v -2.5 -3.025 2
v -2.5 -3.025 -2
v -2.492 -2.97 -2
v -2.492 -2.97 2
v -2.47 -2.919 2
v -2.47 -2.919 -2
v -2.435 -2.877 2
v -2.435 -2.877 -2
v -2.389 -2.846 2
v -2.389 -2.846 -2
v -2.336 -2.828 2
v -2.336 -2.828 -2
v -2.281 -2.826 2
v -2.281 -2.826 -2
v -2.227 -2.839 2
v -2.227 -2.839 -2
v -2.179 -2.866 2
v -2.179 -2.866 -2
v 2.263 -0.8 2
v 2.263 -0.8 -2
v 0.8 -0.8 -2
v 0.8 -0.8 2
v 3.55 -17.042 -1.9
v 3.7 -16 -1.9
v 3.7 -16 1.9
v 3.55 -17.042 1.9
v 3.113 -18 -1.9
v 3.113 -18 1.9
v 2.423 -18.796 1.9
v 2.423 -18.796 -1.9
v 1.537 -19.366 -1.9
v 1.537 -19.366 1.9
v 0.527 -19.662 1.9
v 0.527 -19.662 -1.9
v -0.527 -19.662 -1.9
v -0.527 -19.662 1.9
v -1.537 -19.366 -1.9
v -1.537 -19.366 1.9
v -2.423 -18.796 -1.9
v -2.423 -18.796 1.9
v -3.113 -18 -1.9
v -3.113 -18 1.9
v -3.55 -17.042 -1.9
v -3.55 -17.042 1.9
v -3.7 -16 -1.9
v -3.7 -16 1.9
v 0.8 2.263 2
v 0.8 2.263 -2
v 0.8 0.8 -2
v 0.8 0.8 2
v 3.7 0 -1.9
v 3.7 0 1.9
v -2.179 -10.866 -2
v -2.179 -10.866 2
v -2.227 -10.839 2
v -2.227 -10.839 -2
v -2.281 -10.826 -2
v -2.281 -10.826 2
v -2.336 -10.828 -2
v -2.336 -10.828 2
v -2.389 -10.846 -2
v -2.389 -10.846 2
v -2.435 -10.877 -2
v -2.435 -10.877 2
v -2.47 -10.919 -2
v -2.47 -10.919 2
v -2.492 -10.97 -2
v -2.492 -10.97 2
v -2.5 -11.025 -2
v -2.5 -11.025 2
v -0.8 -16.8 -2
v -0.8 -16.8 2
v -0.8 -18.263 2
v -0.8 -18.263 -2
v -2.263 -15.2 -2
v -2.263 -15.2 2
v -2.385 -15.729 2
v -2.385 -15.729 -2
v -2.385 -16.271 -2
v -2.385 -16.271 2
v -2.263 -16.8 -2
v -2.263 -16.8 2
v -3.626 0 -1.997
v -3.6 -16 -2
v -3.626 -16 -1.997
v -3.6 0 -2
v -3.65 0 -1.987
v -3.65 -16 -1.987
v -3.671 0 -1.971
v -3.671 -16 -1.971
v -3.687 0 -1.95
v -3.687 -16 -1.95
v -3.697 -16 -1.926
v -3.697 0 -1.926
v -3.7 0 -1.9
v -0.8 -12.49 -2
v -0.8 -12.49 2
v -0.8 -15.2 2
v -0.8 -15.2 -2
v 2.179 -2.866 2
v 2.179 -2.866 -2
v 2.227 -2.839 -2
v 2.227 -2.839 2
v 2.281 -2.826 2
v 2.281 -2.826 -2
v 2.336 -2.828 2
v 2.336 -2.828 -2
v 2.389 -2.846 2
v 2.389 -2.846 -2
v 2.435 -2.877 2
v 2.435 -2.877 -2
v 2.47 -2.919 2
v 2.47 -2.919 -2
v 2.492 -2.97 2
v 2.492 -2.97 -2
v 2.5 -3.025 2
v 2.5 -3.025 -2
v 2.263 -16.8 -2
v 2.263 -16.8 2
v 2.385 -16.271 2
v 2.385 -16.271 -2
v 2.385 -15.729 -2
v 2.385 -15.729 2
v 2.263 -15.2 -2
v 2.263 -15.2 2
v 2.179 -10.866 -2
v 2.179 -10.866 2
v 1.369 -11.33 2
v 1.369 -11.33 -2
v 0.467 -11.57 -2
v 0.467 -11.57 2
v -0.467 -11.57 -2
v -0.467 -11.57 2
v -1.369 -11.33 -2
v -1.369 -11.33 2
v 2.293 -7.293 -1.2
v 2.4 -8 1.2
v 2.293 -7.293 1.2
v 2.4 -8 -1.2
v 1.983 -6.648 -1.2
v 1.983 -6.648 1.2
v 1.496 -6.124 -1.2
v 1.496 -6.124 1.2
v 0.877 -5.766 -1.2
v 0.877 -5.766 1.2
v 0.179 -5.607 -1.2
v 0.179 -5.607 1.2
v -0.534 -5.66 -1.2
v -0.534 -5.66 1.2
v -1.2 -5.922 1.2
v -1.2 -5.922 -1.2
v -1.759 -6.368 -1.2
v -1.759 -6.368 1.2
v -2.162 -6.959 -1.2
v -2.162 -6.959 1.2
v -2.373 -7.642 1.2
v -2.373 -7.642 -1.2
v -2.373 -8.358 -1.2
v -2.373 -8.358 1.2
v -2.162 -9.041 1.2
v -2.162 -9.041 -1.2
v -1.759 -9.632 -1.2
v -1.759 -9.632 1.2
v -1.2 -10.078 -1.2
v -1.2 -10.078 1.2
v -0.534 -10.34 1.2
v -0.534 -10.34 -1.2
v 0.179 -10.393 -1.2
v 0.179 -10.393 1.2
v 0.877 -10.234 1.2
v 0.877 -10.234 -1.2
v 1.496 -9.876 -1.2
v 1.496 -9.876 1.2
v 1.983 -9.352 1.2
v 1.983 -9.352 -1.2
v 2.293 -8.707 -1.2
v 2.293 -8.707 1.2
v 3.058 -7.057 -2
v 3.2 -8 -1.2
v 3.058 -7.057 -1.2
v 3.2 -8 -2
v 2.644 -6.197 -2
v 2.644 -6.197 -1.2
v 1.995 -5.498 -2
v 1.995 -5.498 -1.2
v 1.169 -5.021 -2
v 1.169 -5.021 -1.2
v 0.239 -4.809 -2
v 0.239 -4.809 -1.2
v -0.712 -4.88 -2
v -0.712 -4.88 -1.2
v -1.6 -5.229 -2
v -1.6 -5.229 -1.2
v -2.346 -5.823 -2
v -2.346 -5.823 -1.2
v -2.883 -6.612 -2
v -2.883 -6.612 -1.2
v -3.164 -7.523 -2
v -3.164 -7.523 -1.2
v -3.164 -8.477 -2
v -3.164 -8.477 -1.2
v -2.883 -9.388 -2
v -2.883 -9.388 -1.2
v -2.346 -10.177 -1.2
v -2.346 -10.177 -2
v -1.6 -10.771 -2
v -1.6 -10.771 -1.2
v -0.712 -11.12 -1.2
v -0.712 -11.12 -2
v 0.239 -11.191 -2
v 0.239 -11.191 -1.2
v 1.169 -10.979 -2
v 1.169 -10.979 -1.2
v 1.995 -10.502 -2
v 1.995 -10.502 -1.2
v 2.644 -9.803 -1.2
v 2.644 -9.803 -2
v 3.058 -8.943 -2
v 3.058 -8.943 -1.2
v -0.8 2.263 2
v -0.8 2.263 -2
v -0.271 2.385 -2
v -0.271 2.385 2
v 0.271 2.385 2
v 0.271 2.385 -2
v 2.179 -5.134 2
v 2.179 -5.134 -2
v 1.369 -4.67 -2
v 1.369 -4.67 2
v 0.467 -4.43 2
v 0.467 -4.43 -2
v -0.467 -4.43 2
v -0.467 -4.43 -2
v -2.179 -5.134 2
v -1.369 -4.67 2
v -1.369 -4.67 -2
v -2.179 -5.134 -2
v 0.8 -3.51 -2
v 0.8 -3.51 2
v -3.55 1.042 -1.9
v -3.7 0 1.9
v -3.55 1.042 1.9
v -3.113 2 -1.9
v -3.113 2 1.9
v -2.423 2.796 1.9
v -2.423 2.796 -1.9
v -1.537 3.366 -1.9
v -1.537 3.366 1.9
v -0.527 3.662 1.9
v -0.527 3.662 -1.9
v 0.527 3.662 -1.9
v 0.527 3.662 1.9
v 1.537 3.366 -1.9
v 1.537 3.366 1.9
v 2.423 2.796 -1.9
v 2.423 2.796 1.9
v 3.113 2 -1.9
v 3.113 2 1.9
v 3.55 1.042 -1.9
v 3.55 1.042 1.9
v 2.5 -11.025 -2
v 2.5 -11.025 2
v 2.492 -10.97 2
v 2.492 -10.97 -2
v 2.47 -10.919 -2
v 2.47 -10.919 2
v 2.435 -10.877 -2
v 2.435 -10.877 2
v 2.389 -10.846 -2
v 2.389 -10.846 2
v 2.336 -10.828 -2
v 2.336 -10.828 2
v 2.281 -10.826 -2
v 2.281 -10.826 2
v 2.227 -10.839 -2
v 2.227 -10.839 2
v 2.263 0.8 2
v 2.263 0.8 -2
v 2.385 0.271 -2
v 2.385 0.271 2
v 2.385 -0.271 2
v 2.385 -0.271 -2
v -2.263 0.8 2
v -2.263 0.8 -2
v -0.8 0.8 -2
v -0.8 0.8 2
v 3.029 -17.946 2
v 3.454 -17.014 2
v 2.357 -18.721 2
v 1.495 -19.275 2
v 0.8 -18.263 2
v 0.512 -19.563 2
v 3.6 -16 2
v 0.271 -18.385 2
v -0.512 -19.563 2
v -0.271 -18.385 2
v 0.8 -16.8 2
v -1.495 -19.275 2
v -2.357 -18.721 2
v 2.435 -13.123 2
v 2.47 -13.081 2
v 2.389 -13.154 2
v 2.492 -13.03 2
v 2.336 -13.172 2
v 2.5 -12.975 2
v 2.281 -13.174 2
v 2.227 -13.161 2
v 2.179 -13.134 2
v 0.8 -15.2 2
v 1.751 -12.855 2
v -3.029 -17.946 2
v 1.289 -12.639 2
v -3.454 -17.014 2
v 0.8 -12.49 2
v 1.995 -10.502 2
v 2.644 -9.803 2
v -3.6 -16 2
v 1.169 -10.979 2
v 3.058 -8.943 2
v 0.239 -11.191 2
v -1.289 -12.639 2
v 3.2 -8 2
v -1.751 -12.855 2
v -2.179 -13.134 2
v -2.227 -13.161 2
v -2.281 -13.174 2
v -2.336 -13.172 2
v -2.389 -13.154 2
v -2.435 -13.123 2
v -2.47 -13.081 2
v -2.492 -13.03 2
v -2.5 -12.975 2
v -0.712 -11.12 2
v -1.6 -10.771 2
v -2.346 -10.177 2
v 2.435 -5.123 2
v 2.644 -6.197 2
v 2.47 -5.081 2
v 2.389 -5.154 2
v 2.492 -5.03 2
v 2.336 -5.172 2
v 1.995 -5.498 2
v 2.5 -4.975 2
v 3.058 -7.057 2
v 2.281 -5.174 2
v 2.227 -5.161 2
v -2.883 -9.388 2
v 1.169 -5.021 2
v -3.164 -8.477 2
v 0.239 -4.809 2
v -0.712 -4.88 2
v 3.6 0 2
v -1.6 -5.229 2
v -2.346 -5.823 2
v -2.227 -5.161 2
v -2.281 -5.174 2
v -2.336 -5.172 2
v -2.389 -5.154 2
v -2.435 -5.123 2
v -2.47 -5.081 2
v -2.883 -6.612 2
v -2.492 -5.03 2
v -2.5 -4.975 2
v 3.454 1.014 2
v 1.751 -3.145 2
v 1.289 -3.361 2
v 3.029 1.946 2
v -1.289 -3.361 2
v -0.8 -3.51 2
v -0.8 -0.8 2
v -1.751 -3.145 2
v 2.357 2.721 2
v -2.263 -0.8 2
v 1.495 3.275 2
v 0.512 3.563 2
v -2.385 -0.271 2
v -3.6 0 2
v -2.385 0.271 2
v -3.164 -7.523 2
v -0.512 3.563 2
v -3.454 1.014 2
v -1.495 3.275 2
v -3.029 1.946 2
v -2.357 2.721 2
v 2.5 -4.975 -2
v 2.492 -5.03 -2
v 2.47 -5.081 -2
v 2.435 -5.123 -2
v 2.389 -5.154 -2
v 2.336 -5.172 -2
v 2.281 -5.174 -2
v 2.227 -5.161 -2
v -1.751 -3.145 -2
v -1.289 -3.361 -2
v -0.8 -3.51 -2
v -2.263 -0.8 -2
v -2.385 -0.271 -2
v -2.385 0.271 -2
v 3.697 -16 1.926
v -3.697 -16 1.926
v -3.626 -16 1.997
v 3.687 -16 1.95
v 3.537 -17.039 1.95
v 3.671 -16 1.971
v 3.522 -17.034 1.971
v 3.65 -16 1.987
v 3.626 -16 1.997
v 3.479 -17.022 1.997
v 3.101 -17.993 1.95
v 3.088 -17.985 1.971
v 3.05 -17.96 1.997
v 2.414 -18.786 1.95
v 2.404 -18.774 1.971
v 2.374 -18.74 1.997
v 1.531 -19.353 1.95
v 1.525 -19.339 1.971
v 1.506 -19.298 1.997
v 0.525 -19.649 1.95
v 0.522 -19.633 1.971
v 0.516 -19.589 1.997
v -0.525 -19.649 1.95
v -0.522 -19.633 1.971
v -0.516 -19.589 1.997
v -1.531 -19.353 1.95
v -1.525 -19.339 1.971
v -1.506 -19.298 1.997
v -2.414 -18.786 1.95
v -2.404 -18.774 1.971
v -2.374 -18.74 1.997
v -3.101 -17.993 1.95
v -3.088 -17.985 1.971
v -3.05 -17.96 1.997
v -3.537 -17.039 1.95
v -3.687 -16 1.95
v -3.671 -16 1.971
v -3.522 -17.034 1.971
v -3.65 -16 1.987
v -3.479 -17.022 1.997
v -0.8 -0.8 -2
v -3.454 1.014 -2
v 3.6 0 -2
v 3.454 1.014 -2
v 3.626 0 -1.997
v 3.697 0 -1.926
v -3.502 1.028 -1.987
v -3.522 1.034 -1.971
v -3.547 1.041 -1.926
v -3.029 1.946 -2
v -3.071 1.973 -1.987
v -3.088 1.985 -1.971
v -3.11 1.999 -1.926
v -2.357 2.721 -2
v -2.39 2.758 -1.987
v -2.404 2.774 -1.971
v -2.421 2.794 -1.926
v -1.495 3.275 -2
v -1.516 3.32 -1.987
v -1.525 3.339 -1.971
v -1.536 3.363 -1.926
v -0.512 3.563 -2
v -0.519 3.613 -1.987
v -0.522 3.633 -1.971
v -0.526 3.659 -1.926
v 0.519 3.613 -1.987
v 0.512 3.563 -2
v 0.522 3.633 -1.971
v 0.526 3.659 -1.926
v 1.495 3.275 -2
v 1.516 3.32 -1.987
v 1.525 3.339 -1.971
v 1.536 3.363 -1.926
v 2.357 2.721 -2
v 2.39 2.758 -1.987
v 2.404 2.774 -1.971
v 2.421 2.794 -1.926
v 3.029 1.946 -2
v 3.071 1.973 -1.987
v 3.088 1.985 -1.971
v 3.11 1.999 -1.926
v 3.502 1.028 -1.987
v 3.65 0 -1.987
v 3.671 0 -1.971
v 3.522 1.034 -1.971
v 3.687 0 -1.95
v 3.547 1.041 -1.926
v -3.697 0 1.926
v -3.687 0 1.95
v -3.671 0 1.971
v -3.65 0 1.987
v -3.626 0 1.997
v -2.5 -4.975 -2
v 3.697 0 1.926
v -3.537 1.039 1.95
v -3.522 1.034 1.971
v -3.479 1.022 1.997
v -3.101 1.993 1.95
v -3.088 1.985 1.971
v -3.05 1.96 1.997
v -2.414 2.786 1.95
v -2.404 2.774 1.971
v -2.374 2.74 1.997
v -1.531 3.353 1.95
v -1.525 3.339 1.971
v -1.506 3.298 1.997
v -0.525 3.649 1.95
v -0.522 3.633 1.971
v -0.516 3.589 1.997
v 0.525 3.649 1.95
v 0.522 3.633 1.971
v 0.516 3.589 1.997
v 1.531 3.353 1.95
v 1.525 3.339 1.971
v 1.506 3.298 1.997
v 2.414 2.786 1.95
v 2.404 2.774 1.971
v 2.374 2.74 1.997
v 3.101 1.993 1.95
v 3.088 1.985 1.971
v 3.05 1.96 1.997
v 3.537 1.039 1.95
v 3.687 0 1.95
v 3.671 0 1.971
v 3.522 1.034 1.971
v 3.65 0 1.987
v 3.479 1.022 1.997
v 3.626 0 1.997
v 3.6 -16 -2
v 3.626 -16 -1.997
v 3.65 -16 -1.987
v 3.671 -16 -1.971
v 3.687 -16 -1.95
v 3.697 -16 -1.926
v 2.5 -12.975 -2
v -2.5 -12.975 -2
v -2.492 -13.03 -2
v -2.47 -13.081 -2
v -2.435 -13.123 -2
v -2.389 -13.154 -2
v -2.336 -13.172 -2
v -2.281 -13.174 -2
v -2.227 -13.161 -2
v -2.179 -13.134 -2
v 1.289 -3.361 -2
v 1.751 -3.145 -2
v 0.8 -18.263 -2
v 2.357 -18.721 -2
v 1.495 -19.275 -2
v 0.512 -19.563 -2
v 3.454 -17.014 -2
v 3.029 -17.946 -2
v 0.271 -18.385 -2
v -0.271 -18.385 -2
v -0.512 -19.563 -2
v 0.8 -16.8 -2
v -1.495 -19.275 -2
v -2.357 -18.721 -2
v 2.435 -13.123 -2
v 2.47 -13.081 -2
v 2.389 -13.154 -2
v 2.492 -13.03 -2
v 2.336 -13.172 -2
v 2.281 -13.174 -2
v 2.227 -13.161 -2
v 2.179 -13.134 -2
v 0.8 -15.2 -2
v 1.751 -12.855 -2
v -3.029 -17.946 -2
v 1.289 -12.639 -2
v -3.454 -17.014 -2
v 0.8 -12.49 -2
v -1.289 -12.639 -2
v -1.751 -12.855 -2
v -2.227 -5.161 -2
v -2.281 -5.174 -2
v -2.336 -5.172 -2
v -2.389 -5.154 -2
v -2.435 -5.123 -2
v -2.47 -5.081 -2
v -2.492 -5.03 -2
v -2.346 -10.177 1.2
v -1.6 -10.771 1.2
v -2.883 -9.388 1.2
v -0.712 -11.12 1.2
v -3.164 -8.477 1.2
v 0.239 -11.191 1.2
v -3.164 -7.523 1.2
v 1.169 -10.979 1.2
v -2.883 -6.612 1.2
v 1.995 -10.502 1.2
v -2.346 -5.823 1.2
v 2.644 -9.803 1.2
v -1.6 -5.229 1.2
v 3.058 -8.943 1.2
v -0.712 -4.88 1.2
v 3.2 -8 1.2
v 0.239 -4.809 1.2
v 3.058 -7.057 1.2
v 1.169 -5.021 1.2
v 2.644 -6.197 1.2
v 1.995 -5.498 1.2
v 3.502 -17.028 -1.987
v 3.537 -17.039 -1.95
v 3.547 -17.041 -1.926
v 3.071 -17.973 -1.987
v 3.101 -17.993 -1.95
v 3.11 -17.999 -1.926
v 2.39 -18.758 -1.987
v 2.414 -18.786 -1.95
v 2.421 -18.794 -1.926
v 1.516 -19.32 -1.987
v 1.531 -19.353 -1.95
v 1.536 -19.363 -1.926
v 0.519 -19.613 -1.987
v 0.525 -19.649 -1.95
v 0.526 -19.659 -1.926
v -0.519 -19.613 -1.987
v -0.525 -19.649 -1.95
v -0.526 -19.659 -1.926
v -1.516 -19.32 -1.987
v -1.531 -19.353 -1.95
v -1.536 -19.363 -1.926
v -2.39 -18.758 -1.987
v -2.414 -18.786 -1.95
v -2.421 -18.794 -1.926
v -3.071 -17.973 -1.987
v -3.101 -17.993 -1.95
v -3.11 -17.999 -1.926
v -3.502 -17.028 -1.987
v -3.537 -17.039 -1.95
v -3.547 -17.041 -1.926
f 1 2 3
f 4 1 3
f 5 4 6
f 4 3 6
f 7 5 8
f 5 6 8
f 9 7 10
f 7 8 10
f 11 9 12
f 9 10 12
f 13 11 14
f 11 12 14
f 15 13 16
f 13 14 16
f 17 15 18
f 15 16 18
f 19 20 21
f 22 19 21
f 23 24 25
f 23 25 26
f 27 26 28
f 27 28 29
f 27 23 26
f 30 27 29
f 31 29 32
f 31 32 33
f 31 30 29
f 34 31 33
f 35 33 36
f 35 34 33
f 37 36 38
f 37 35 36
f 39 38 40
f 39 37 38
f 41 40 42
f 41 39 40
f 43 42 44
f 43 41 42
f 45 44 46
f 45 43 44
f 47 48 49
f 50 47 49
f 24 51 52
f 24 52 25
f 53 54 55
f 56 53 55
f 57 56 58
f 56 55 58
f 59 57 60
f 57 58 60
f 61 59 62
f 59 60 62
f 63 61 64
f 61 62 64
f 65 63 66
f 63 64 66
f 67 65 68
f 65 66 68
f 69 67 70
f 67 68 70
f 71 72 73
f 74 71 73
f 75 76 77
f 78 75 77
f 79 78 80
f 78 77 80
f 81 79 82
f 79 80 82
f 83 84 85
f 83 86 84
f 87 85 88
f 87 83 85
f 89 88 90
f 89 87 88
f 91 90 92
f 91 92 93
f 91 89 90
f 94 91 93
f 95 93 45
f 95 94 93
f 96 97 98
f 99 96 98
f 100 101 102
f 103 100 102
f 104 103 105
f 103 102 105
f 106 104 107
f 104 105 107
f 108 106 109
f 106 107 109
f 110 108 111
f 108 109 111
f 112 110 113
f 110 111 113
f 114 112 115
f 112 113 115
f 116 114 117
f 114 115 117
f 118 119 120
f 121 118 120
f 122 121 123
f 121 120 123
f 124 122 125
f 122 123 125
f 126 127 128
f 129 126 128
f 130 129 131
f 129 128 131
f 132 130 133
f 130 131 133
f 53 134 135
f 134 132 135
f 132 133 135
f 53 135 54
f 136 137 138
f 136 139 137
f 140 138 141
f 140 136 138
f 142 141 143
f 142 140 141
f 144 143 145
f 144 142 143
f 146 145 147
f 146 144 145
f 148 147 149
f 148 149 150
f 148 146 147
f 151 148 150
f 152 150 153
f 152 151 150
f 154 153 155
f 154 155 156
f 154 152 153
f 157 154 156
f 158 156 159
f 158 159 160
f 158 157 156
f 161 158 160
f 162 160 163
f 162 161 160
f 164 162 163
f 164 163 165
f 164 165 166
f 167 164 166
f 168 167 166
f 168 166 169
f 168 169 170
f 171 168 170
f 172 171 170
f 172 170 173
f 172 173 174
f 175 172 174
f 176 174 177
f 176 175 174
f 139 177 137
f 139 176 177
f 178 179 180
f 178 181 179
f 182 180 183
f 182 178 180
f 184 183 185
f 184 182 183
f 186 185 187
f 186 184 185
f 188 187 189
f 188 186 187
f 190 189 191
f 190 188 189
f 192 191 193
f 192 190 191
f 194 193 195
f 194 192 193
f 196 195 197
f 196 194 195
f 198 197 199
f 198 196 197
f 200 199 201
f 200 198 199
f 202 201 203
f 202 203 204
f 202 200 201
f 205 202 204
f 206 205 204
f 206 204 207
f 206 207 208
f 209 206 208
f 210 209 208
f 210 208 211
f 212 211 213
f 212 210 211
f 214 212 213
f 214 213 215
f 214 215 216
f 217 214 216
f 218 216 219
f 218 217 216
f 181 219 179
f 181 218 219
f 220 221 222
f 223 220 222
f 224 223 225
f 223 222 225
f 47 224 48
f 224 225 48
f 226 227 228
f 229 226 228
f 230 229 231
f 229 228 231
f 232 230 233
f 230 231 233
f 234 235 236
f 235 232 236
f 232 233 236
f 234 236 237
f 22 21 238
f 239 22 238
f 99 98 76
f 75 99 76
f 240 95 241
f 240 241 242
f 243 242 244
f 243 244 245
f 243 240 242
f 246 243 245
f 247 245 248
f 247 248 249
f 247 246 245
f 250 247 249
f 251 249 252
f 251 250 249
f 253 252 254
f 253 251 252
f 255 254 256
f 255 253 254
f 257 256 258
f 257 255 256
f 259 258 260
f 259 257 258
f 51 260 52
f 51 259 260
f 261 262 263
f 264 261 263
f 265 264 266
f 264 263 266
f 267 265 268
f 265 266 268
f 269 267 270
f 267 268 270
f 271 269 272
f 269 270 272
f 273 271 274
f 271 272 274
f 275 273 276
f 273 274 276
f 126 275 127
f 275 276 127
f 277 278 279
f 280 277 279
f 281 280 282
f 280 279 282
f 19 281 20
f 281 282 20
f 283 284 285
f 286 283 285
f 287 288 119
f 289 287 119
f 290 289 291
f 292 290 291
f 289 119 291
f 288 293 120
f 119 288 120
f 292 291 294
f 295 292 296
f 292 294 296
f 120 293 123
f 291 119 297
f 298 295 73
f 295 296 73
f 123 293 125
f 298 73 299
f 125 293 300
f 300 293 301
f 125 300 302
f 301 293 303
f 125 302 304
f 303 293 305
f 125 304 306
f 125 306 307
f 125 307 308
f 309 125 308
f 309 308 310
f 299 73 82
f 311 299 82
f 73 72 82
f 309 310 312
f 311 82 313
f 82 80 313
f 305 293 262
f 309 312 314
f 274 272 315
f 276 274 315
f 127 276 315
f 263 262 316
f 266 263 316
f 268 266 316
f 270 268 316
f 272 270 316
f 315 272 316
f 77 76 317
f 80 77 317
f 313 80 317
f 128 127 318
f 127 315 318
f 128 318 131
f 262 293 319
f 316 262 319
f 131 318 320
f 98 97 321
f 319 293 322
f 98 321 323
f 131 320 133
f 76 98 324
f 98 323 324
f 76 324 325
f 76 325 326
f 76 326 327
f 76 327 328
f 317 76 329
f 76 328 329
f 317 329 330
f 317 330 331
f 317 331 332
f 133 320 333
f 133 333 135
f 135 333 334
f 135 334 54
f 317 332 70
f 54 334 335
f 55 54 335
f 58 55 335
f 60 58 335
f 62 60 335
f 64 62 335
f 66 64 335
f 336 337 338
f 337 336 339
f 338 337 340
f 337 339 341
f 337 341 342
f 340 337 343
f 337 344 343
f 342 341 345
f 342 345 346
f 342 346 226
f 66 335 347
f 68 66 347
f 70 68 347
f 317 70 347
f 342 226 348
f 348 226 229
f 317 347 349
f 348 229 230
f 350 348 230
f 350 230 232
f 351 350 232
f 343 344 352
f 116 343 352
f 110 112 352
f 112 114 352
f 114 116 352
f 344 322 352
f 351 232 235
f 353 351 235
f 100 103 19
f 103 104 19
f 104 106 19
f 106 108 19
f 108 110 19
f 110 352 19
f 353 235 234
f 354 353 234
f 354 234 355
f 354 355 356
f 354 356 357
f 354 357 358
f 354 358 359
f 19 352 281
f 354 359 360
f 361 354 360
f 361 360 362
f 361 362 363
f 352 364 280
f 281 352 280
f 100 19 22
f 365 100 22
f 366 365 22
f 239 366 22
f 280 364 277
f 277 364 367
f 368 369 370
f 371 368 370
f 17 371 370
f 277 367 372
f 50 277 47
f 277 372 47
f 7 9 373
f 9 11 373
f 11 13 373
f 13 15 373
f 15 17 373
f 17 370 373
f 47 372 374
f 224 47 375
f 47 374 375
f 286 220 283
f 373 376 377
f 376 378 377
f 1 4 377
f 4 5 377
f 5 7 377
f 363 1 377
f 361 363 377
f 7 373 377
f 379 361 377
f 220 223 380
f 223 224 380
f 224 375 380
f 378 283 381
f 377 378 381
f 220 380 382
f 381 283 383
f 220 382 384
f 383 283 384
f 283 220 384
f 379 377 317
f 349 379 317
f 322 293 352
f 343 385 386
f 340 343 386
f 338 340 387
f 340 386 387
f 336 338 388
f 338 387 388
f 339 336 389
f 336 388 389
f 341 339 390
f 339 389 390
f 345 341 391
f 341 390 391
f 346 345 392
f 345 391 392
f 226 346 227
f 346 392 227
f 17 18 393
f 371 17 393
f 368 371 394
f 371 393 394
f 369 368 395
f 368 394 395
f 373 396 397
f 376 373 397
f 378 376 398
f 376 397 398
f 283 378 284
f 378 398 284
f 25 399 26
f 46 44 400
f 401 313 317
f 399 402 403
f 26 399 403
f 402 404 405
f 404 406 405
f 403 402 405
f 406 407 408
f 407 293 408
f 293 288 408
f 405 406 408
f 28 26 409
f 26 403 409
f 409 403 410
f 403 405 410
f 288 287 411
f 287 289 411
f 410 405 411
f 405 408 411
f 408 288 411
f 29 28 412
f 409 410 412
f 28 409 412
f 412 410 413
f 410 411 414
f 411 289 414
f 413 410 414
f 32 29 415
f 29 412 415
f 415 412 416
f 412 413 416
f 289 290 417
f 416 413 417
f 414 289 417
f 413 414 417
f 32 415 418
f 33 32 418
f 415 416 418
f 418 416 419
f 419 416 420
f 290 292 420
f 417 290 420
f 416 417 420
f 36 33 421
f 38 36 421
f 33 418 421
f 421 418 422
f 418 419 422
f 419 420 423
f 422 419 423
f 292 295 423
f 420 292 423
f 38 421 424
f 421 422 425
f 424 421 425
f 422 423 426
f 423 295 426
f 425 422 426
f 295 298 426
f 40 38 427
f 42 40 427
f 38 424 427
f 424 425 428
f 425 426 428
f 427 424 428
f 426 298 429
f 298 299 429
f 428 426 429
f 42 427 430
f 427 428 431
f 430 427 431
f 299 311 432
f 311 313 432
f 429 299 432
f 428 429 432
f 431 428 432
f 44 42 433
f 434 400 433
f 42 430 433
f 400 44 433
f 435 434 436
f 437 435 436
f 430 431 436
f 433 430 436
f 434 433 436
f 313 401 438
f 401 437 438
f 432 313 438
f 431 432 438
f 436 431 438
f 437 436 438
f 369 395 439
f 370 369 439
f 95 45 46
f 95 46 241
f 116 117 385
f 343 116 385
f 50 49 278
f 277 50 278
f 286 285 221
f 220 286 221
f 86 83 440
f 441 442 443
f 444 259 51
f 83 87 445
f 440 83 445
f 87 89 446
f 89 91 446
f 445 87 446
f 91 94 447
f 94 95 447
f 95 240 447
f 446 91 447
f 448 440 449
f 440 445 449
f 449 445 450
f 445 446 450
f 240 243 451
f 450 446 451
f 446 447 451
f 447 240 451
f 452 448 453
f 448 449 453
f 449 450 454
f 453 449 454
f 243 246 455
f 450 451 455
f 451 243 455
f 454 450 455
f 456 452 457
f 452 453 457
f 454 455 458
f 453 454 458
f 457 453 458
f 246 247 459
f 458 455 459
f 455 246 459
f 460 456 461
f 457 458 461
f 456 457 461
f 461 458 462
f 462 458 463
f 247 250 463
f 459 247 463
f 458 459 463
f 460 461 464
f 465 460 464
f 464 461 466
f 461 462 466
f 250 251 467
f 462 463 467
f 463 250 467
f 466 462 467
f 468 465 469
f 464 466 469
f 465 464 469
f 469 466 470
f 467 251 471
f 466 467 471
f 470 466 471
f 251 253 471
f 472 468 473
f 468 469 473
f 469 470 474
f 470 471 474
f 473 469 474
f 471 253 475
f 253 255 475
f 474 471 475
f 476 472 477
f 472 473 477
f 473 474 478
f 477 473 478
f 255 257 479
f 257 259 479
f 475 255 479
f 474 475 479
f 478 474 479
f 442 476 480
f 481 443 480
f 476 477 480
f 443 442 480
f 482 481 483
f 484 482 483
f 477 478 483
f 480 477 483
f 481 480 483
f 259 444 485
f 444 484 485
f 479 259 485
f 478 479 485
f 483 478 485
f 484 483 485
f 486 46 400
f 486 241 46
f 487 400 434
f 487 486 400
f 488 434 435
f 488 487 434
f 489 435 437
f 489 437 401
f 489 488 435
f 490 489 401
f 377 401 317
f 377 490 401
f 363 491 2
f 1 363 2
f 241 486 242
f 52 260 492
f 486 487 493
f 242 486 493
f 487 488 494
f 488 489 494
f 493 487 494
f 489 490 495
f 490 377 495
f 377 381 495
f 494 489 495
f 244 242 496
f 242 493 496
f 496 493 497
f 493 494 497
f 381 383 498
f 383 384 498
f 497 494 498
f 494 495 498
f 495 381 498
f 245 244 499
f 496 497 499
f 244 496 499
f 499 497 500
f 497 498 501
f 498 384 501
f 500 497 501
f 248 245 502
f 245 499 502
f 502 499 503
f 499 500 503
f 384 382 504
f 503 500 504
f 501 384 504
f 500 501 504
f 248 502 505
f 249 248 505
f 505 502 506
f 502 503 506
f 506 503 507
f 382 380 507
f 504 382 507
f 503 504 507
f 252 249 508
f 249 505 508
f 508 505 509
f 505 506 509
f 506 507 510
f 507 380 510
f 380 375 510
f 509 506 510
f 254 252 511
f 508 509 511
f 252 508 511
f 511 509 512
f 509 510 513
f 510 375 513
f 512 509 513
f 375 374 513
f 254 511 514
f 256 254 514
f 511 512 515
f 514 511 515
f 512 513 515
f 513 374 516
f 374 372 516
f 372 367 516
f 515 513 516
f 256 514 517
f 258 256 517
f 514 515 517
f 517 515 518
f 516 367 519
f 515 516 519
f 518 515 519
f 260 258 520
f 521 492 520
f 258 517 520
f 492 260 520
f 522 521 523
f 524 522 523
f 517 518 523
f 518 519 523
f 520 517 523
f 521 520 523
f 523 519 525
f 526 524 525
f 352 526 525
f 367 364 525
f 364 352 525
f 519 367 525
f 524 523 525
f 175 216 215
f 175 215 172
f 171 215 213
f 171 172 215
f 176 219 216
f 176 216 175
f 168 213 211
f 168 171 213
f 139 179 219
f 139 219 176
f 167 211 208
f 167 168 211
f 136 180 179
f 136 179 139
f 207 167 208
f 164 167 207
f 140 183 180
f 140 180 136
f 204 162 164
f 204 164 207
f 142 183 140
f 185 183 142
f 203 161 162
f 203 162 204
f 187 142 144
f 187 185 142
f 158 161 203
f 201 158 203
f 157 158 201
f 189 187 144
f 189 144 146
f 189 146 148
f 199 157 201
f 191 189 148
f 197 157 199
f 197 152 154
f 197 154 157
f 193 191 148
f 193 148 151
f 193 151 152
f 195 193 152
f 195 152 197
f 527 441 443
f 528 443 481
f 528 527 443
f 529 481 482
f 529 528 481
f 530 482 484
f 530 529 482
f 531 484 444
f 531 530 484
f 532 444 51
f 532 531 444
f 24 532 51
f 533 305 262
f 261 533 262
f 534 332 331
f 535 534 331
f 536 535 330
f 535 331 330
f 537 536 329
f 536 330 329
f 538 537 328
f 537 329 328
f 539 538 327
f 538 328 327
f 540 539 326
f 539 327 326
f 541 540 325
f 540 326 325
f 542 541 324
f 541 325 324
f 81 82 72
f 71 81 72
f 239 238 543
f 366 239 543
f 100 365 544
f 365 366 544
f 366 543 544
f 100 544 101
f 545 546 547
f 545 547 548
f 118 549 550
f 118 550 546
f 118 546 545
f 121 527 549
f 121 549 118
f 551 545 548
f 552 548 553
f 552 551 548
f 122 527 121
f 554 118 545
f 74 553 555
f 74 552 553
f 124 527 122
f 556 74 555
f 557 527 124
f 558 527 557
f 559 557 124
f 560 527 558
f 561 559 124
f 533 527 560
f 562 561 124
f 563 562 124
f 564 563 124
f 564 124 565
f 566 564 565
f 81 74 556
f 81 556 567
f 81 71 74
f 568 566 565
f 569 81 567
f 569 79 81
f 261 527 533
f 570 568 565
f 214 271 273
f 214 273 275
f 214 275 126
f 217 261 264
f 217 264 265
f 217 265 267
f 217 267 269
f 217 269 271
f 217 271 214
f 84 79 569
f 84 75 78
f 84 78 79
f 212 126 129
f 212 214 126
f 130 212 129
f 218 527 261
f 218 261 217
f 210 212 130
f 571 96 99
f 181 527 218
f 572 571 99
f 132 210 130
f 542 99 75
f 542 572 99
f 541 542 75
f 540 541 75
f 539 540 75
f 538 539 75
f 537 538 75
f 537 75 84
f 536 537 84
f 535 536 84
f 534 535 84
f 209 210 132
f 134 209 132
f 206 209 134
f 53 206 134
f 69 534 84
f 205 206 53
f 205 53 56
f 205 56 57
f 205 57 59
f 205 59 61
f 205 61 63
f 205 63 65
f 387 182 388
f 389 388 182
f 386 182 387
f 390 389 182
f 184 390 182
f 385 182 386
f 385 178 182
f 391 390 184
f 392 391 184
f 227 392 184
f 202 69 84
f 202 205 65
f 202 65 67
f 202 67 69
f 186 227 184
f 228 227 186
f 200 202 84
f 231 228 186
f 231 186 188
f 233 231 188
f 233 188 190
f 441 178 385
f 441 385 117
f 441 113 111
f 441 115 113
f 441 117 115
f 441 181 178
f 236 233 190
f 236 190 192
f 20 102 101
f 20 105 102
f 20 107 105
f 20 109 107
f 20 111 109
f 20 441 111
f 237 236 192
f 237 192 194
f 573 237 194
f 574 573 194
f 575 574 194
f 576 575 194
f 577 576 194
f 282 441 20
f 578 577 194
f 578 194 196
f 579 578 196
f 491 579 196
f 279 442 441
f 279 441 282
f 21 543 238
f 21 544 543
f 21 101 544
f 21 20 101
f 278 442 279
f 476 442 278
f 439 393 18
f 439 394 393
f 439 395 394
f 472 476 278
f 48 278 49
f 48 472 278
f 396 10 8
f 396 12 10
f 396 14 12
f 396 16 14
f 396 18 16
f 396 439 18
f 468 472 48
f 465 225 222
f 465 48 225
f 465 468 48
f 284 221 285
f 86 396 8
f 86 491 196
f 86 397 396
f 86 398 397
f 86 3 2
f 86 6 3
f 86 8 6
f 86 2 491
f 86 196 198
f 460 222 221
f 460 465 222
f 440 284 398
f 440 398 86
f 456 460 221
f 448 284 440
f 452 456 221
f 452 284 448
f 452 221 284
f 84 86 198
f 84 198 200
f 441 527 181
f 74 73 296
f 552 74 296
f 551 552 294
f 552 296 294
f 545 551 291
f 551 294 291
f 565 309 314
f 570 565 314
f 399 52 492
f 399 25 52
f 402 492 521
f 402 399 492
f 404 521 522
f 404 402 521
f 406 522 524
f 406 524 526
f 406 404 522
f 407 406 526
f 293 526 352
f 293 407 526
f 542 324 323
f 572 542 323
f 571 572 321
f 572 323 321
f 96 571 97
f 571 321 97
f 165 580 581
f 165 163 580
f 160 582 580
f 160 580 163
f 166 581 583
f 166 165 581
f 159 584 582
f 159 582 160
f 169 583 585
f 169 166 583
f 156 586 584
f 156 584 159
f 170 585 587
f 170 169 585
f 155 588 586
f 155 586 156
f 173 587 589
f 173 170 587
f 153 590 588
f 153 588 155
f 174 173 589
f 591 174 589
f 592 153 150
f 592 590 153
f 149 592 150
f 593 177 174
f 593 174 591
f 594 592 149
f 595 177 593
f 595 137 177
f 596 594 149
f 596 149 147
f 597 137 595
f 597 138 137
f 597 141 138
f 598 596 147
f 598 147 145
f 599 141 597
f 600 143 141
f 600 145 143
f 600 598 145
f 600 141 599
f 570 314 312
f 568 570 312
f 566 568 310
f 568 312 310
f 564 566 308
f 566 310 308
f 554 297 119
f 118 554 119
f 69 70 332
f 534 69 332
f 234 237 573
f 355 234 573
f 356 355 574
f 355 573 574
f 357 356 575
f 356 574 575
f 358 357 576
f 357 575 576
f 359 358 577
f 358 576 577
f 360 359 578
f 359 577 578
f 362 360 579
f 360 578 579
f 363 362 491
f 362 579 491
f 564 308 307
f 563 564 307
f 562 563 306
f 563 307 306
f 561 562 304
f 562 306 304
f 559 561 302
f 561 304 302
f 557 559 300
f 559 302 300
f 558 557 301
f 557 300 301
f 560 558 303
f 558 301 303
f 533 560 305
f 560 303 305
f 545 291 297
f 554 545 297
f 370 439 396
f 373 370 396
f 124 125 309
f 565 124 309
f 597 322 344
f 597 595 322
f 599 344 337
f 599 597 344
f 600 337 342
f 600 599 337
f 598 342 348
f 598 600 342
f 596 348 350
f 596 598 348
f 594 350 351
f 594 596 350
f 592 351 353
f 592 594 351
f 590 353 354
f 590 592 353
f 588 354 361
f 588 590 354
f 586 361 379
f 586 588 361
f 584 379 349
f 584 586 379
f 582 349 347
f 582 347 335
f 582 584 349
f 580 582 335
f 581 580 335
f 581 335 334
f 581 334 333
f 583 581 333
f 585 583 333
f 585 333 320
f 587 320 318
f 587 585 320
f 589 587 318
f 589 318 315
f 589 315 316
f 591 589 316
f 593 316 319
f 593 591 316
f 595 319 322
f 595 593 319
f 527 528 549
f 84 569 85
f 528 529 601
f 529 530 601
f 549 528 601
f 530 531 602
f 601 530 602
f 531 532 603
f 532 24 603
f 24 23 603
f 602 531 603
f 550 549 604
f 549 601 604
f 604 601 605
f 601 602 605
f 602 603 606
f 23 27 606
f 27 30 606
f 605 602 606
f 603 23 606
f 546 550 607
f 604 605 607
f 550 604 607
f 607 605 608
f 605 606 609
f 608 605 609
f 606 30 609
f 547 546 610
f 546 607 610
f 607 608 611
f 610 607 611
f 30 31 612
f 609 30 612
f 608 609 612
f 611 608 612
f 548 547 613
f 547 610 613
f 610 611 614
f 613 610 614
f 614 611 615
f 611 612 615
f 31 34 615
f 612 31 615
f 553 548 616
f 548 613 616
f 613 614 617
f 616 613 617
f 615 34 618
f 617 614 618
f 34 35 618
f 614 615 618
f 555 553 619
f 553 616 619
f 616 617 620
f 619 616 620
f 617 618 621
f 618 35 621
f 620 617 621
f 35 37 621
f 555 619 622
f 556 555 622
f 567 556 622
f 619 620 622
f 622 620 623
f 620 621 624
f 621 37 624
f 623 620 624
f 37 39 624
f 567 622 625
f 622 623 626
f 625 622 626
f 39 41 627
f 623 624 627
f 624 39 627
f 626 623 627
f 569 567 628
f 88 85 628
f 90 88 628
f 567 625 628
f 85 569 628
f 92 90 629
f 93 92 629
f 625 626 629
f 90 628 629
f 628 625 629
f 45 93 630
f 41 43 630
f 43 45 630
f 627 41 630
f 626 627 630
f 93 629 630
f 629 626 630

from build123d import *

# Parameters (mm, degrees)
BOSS_EXTRUDE1_DEPTH = 4
CUT_EXTRUDE1_DEPTH  = 21.439667316
CUT_EXTRUDE2_DEPTH  = 21.439667316
FILLET1_R           = 0.1


with BuildPart() as part:
    # Sketch1 → Boss-Extrude1 (new body)
    with BuildSketch(Plane(origin=(0, 0, -2), x_dir=(-1, 0, 0), z_dir=(0, 0, -1))):
        with BuildLine():
            Line((-3.7, 0), (-3.7, -16))
            ThreePointArc((-3.7, -16), (0, -19.7), (3.7, -16))
            Line((3.7, -16), (3.7, 0))
            ThreePointArc((3.7, 0), (0, 3.7), (-3.7, 0))
        make_face()
    extrude(amount=-BOSS_EXTRUDE1_DEPTH)

    # Sketch2 → Cut-Extrude1 (cut, through all)
    with BuildSketch(Plane(origin=(0, 0, -2), x_dir=(-1, 0, 0), z_dir=(0, 0, -1))):
        with BuildLine():
            Line((-0.8, -0.8), (-0.8, -3.509985755))
            ThreePointArc((-0.8, -3.509985755), (-1.523912922, -3.261547088), (-2.178947368, -2.865691603))
            ThreePointArc((-2.178947368, -2.865691603), (-2.388852332, -2.845717276), (-2.5, -3.024896692))
            Line((-2.5, -3.024896692), (-2.5, -4.975103308))
            ThreePointArc((-2.5, -4.975103308), (-2.388852332, -5.154282724), (-2.178947368, -5.134308397))
            ThreePointArc((-2.178947368, -5.134308397), (0, -4.4), (2.178947368, -5.134308397))
            ThreePointArc((2.178947368, -5.134308397), (2.388852332, -5.154282724), (2.5, -4.975103308))
            Line((2.5, -4.975103308), (2.5, -3.024896692))
            ThreePointArc((2.5, -3.024896692), (2.388852332, -2.845717276), (2.178947368, -2.865691603))
            ThreePointArc((2.178947368, -2.865691603), (1.523912922, -3.261547088), (0.8, -3.509985755))
            Line((0.8, -3.509985755), (0.8, -0.8))
            Line((0.8, -0.8), (2.2627417, -0.8))
            ThreePointArc((2.2627417, -0.8), (2.4, 0), (2.2627417, 0.8))
            Line((2.2627417, 0.8), (0.8, 0.8))
            Line((0.8, 0.8), (0.8, 2.2627417))
            ThreePointArc((0.8, 2.2627417), (0, 2.4), (-0.8, 2.2627417))
            Line((-0.8, 2.2627417), (-0.8, 0.8))
            Line((-0.8, 0.8), (-2.2627417, 0.8))
            ThreePointArc((-2.2627417, 0.8), (-2.4, 0), (-2.2627417, -0.8))
            Line((-2.2627417, -0.8), (-0.8, -0.8))
        make_face()
    extrude(amount=-CUT_EXTRUDE1_DEPTH, mode=Mode.SUBTRACT)

    # Sketch3 → Cut-Extrude2 (cut, through all)
    with BuildSketch(Plane.XY.offset(2)):
        with BuildLine():
            Line((2.5, -12.975103308), (2.5, -11.024896692))
            ThreePointArc((2.5, -11.024896692), (2.388852332, -10.845717276), (2.178947368, -10.865691603))
            ThreePointArc((2.178947368, -10.865691603), (0, -11.6), (-2.178947368, -10.865691603))
            ThreePointArc((-2.178947368, -10.865691603), (-2.388852332, -10.845717276), (-2.5, -11.024896692))
            Line((-2.5, -11.024896692), (-2.5, -12.975103308))
            ThreePointArc((-2.5, -12.975103308), (-2.388852332, -13.154282724), (-2.178947368, -13.134308397))
            ThreePointArc((-2.178947368, -13.134308397), (-1.523912922, -12.738452912), (-0.8, -12.490014245))
            Line((-0.8, -12.490014245), (-0.8, -15.2))
            Line((-0.8, -15.2), (-2.2627417, -15.2))
            ThreePointArc((-2.2627417, -15.2), (-2.4, -16), (-2.2627417, -16.8))
            Line((-2.2627417, -16.8), (-0.8, -16.8))
            Line((-0.8, -16.8), (-0.8, -18.2627417))
            ThreePointArc((-0.8, -18.2627417), (0, -18.4), (0.8, -18.2627417))
            Line((0.8, -18.2627417), (0.8, -16.8))
            Line((0.8, -16.8), (2.2627417, -16.8))
            ThreePointArc((2.2627417, -16.8), (2.4, -16), (2.2627417, -15.2))
            Line((2.2627417, -15.2), (0.8, -15.2))
            Line((0.8, -15.2), (0.8, -12.490014245))
            ThreePointArc((0.8, -12.490014245), (1.523912922, -12.738452912), (2.178947368, -13.134308397))
            ThreePointArc((2.178947368, -13.134308397), (2.388852332, -13.154282724), (2.5, -12.975103308))
        make_face()
    extrude(amount=-CUT_EXTRUDE2_DEPTH, mode=Mode.SUBTRACT)

    # Sketch4 → Cut-Revolve1 (revolve, cut)
    with BuildSketch(Plane(origin=(0, -8, 0), x_dir=(1, 0, 0), z_dir=(0, 1, 0))):
        Polygon((3.2, 2), (0, 2), (0, -2), (3.2, -2), (3.2, -1.2), (2.4, -1.2), (2.4, 1.2), (3.2, 1.2), align=None)
    revolve(axis=Axis((0, -8, -2), (0, 0, 1)), mode=Mode.SUBTRACT)

    # Fillet1
    fillet1_edges = [part.edges().sort_by_distance(p)[0] for p in [
        (0, -19.7, 2),
        (-3.7, -8, 2),
        (0, 3.7, 2),
        (-3.7, -8, -2),
        (0, -19.7, -2),
        (3.7, -8, -2),
        (0, 3.7, -2),
        (3.7, -8, 2),
    ]]
    fillet(fillet1_edges, radius=FILLET1_R)


solid = part.part
